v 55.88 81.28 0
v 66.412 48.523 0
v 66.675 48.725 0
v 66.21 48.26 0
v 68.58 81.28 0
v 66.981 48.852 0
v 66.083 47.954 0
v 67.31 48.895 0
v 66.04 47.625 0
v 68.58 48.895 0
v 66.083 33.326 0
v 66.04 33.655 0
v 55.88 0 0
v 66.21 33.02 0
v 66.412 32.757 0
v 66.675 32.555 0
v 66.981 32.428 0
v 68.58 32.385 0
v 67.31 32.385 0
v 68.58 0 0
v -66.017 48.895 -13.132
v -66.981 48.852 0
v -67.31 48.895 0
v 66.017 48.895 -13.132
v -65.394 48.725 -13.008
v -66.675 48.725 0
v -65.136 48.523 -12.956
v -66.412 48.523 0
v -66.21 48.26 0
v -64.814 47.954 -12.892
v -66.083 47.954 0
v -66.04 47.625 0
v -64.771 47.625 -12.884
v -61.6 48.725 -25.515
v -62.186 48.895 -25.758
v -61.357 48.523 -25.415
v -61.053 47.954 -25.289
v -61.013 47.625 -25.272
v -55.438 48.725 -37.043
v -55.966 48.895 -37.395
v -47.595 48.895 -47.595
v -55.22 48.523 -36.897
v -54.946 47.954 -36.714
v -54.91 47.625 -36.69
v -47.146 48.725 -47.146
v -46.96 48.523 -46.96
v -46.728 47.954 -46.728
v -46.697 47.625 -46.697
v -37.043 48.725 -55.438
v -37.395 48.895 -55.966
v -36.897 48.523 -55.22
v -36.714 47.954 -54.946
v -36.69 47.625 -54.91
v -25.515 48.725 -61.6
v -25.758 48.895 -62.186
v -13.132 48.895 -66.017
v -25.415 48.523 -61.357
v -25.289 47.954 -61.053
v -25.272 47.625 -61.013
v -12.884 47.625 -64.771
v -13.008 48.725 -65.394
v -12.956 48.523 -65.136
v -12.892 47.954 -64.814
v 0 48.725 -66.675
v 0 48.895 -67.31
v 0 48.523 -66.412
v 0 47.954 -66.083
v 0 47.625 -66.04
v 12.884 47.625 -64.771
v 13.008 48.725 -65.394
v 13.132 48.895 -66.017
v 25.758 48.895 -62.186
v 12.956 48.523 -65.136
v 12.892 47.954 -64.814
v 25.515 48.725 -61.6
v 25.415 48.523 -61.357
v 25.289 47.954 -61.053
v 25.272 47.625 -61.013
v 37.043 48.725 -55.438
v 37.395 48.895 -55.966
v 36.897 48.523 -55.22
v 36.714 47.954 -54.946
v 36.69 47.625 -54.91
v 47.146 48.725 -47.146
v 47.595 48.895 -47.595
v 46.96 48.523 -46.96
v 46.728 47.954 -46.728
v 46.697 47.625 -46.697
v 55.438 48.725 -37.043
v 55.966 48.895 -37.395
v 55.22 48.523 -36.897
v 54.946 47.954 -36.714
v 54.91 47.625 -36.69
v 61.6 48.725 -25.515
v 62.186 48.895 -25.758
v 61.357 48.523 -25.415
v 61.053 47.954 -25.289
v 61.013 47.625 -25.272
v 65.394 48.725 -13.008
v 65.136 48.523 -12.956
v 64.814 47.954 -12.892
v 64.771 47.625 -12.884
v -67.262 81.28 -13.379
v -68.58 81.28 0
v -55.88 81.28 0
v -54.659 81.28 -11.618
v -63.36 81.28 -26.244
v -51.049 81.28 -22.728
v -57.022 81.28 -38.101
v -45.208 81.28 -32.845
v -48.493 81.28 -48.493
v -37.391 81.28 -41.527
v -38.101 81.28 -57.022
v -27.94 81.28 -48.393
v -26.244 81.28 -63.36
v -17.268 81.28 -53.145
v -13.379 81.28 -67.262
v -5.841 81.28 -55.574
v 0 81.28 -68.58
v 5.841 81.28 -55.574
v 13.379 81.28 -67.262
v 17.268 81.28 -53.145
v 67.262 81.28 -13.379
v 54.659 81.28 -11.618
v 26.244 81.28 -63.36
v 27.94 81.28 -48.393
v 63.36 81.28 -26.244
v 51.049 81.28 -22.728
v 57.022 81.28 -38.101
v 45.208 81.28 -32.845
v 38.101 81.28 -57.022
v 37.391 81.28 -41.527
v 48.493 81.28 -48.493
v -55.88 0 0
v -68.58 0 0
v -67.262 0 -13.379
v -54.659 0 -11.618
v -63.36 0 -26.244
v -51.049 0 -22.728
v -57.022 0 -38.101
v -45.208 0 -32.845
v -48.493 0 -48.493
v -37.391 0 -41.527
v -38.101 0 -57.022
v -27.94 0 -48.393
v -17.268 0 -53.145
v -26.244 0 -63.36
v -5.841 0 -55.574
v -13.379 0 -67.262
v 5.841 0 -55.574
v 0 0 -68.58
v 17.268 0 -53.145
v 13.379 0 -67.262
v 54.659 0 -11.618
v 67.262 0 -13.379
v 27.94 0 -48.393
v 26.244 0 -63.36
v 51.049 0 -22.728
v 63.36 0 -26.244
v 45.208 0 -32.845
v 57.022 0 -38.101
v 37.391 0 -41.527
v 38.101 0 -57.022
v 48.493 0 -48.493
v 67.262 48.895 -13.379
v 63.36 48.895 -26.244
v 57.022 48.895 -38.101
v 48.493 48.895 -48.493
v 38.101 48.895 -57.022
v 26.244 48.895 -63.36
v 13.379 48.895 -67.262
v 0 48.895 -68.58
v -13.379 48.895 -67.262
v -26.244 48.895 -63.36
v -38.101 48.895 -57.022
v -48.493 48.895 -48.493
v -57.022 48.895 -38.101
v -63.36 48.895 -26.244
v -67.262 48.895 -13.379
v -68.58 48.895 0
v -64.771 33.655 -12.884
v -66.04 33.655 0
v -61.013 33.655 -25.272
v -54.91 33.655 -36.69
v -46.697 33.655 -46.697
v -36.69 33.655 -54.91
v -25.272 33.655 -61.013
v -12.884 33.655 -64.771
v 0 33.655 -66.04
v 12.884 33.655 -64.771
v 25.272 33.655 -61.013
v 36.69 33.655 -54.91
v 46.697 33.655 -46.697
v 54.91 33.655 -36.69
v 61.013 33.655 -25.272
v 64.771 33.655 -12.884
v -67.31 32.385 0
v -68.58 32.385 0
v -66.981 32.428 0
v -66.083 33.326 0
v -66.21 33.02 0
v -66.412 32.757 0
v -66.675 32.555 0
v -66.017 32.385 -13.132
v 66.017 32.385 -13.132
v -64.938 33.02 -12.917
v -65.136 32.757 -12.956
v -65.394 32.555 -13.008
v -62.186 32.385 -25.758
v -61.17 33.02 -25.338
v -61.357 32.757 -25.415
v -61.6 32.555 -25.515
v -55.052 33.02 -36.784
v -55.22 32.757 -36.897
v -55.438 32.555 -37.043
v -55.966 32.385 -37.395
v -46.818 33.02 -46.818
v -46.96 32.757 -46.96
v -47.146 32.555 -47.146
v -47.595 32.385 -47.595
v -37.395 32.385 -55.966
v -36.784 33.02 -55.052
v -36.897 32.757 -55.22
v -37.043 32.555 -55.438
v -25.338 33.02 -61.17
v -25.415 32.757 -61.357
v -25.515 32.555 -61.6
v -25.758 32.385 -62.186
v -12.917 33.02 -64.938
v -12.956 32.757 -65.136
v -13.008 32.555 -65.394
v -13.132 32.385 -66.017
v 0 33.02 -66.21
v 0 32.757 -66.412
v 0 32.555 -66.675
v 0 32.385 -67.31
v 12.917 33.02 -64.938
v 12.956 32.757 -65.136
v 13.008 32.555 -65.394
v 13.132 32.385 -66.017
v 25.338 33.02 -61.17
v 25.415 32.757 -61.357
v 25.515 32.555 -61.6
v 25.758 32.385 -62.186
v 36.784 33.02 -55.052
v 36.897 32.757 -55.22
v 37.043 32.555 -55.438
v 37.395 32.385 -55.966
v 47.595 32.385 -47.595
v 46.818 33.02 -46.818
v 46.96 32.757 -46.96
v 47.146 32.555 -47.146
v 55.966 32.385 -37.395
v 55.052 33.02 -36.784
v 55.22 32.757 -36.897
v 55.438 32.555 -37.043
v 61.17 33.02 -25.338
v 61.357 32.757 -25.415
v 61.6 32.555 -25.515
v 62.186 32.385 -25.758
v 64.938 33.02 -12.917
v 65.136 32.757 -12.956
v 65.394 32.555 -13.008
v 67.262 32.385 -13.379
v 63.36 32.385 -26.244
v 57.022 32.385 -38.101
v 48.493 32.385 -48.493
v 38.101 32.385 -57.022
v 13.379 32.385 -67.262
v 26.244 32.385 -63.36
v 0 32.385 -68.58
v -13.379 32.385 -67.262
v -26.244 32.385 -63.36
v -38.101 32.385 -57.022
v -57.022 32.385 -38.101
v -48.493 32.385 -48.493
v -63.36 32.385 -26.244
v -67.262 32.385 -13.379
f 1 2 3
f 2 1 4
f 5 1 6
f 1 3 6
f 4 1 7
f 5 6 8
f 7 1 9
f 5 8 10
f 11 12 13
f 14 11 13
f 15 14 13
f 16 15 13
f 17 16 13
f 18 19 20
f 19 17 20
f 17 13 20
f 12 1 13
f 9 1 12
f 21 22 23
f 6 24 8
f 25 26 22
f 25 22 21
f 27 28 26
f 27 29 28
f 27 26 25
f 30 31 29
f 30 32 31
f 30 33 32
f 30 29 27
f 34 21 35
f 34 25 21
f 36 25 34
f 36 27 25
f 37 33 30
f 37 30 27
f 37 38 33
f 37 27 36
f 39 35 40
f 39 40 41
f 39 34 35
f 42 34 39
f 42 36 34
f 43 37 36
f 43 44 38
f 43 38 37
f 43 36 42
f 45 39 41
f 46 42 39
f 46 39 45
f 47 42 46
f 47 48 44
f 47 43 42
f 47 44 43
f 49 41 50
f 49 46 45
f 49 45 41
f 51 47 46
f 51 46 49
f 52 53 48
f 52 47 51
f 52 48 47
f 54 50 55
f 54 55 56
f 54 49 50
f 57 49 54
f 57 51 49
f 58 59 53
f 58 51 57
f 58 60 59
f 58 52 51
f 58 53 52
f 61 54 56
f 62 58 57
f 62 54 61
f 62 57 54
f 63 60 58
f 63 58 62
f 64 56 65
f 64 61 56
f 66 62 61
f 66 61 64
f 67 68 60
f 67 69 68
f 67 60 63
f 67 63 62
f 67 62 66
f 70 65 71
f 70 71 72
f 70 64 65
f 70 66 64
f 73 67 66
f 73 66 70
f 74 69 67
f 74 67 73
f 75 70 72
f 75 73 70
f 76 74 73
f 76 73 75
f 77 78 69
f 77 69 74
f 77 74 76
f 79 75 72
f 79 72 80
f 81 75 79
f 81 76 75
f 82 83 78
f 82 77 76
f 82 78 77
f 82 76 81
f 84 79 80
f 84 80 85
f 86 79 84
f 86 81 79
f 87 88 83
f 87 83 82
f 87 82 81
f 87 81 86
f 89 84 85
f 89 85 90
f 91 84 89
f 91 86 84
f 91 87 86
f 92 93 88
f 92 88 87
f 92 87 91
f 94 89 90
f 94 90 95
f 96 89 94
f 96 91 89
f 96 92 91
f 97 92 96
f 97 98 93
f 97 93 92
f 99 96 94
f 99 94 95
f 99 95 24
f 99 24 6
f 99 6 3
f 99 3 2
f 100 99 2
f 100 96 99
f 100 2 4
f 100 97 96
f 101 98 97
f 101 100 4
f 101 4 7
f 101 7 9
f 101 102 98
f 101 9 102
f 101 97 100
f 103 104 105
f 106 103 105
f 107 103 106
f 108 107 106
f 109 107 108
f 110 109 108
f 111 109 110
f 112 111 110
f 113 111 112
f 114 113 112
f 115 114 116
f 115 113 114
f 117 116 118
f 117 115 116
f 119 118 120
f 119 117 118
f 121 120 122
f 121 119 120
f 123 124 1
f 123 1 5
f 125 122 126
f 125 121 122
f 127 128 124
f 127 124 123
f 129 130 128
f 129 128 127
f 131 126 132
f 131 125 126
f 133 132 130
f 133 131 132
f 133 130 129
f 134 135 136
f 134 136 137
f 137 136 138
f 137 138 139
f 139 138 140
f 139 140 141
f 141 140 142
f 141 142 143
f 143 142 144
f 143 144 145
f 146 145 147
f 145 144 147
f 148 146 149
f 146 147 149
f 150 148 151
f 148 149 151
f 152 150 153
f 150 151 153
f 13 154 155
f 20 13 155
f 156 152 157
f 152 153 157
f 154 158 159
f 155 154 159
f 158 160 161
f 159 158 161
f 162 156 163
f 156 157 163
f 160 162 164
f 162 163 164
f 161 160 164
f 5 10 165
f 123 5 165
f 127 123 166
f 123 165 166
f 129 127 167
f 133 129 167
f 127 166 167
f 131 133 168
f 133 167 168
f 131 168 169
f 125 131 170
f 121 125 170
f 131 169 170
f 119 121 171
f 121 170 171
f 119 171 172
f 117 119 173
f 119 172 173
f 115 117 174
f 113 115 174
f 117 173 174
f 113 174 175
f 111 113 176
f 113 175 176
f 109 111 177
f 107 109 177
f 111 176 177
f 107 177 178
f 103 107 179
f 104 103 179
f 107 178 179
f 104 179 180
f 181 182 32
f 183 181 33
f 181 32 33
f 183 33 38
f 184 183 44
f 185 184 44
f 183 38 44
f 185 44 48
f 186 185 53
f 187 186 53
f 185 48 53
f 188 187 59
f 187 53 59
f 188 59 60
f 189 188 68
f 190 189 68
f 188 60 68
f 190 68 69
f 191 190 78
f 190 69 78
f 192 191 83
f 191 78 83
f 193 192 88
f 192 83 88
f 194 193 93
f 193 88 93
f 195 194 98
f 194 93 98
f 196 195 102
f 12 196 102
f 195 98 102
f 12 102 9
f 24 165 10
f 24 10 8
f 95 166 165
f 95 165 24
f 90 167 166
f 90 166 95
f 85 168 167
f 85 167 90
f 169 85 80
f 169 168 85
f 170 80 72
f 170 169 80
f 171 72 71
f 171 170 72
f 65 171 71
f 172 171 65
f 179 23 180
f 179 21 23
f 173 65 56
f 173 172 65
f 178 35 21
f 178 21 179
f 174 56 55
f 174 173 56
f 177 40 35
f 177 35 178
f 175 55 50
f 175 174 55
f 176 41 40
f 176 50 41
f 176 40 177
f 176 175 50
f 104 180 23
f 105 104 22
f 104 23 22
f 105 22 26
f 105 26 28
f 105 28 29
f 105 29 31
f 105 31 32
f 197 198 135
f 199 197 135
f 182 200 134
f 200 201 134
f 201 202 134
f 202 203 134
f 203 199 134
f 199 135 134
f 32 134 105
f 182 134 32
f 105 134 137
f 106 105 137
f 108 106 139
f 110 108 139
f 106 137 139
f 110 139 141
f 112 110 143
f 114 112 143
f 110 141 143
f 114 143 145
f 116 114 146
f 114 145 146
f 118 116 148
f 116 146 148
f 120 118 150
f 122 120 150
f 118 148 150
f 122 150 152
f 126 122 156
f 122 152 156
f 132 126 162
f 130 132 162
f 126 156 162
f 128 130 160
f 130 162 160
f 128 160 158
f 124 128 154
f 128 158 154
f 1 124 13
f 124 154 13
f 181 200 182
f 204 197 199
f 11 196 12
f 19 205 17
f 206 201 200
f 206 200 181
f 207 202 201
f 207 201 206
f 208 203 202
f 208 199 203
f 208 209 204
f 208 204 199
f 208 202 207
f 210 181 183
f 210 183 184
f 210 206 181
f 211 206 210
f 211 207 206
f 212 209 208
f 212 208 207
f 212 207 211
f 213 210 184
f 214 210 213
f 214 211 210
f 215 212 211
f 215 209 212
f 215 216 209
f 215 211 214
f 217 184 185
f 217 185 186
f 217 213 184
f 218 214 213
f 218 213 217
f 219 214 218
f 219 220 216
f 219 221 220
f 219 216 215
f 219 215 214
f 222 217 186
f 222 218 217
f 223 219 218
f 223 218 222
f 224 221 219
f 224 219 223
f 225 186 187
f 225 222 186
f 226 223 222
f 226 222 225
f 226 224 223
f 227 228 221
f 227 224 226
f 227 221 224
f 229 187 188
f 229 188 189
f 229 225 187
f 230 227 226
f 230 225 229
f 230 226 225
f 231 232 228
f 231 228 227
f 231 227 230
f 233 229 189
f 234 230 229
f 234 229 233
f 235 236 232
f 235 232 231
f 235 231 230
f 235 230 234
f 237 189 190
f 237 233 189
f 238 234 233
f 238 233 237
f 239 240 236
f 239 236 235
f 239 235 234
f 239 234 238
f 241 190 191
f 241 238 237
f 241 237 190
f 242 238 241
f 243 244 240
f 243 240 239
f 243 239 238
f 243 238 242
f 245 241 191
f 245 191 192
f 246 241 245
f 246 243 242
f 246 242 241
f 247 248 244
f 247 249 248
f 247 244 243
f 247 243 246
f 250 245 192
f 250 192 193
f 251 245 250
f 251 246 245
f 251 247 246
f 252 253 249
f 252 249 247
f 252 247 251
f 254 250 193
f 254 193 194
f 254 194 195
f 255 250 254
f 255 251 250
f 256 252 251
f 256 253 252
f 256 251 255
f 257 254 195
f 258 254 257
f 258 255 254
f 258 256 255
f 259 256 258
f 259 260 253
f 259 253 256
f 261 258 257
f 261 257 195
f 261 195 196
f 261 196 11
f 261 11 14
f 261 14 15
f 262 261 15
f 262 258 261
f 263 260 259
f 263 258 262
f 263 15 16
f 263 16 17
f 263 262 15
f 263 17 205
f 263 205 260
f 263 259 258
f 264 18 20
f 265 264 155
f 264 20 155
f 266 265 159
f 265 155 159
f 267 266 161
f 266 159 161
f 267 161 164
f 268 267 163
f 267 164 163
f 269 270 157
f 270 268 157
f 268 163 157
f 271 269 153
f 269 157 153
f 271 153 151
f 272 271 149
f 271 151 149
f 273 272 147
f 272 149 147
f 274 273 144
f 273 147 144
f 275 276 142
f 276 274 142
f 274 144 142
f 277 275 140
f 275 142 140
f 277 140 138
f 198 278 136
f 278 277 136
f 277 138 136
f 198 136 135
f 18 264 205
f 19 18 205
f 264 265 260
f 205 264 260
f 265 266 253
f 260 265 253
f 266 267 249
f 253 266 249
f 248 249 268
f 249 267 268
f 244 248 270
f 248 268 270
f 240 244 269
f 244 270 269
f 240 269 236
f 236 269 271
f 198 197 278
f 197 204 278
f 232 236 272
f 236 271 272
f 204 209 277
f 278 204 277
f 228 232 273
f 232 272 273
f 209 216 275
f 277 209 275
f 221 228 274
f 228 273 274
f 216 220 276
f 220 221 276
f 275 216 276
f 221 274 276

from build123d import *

# Parameters (mm, degrees)
BOSS_EXTRUDE1_DEPTH = 81.28
SKETCH2_W           = 2.54
SKETCH2_H           = 16.51
CUT_REVOLVE1_ANGLE  = 180
FILLET1_R           = 1.27


with BuildPart() as part:
    # Sketch1 → Boss-Extrude1 (new body)
    with BuildSketch(Plane(origin=(0, 0, 0), x_dir=(1, 0, 0), z_dir=(0, 1, 0))):
        with BuildLine():
            Line((-68.58, 0), (-55.88, 0))
            ThreePointArc((-55.88, 0), (0, 55.88), (55.88, 0))
            Line((55.88, 0), (68.58, 0))
            ThreePointArc((68.58, 0), (0, 68.58), (-68.58, 0))
        make_face()
    extrude(amount=BOSS_EXTRUDE1_DEPTH)

    # Sketch2 → Cut-Revolve1 (revolve, cut)
    with BuildSketch(Plane.XY):
        with Locations((-67.31, 40.64)):
            Rectangle(SKETCH2_W, SKETCH2_H)
    revolve(axis=Axis((0, 81.28, 0), (0, -1, 0)), revolution_arc=CUT_REVOLVE1_ANGLE, mode=Mode.SUBTRACT)

    # Fillet1
    fillet1_edges = [part.edges().sort_by_distance(p)[0] for p in [
        (0, 48.895, -66.04),
        (0, 32.385, -66.04),
    ]]
    fillet(fillet1_edges, radius=FILLET1_R)


solid = part.part
